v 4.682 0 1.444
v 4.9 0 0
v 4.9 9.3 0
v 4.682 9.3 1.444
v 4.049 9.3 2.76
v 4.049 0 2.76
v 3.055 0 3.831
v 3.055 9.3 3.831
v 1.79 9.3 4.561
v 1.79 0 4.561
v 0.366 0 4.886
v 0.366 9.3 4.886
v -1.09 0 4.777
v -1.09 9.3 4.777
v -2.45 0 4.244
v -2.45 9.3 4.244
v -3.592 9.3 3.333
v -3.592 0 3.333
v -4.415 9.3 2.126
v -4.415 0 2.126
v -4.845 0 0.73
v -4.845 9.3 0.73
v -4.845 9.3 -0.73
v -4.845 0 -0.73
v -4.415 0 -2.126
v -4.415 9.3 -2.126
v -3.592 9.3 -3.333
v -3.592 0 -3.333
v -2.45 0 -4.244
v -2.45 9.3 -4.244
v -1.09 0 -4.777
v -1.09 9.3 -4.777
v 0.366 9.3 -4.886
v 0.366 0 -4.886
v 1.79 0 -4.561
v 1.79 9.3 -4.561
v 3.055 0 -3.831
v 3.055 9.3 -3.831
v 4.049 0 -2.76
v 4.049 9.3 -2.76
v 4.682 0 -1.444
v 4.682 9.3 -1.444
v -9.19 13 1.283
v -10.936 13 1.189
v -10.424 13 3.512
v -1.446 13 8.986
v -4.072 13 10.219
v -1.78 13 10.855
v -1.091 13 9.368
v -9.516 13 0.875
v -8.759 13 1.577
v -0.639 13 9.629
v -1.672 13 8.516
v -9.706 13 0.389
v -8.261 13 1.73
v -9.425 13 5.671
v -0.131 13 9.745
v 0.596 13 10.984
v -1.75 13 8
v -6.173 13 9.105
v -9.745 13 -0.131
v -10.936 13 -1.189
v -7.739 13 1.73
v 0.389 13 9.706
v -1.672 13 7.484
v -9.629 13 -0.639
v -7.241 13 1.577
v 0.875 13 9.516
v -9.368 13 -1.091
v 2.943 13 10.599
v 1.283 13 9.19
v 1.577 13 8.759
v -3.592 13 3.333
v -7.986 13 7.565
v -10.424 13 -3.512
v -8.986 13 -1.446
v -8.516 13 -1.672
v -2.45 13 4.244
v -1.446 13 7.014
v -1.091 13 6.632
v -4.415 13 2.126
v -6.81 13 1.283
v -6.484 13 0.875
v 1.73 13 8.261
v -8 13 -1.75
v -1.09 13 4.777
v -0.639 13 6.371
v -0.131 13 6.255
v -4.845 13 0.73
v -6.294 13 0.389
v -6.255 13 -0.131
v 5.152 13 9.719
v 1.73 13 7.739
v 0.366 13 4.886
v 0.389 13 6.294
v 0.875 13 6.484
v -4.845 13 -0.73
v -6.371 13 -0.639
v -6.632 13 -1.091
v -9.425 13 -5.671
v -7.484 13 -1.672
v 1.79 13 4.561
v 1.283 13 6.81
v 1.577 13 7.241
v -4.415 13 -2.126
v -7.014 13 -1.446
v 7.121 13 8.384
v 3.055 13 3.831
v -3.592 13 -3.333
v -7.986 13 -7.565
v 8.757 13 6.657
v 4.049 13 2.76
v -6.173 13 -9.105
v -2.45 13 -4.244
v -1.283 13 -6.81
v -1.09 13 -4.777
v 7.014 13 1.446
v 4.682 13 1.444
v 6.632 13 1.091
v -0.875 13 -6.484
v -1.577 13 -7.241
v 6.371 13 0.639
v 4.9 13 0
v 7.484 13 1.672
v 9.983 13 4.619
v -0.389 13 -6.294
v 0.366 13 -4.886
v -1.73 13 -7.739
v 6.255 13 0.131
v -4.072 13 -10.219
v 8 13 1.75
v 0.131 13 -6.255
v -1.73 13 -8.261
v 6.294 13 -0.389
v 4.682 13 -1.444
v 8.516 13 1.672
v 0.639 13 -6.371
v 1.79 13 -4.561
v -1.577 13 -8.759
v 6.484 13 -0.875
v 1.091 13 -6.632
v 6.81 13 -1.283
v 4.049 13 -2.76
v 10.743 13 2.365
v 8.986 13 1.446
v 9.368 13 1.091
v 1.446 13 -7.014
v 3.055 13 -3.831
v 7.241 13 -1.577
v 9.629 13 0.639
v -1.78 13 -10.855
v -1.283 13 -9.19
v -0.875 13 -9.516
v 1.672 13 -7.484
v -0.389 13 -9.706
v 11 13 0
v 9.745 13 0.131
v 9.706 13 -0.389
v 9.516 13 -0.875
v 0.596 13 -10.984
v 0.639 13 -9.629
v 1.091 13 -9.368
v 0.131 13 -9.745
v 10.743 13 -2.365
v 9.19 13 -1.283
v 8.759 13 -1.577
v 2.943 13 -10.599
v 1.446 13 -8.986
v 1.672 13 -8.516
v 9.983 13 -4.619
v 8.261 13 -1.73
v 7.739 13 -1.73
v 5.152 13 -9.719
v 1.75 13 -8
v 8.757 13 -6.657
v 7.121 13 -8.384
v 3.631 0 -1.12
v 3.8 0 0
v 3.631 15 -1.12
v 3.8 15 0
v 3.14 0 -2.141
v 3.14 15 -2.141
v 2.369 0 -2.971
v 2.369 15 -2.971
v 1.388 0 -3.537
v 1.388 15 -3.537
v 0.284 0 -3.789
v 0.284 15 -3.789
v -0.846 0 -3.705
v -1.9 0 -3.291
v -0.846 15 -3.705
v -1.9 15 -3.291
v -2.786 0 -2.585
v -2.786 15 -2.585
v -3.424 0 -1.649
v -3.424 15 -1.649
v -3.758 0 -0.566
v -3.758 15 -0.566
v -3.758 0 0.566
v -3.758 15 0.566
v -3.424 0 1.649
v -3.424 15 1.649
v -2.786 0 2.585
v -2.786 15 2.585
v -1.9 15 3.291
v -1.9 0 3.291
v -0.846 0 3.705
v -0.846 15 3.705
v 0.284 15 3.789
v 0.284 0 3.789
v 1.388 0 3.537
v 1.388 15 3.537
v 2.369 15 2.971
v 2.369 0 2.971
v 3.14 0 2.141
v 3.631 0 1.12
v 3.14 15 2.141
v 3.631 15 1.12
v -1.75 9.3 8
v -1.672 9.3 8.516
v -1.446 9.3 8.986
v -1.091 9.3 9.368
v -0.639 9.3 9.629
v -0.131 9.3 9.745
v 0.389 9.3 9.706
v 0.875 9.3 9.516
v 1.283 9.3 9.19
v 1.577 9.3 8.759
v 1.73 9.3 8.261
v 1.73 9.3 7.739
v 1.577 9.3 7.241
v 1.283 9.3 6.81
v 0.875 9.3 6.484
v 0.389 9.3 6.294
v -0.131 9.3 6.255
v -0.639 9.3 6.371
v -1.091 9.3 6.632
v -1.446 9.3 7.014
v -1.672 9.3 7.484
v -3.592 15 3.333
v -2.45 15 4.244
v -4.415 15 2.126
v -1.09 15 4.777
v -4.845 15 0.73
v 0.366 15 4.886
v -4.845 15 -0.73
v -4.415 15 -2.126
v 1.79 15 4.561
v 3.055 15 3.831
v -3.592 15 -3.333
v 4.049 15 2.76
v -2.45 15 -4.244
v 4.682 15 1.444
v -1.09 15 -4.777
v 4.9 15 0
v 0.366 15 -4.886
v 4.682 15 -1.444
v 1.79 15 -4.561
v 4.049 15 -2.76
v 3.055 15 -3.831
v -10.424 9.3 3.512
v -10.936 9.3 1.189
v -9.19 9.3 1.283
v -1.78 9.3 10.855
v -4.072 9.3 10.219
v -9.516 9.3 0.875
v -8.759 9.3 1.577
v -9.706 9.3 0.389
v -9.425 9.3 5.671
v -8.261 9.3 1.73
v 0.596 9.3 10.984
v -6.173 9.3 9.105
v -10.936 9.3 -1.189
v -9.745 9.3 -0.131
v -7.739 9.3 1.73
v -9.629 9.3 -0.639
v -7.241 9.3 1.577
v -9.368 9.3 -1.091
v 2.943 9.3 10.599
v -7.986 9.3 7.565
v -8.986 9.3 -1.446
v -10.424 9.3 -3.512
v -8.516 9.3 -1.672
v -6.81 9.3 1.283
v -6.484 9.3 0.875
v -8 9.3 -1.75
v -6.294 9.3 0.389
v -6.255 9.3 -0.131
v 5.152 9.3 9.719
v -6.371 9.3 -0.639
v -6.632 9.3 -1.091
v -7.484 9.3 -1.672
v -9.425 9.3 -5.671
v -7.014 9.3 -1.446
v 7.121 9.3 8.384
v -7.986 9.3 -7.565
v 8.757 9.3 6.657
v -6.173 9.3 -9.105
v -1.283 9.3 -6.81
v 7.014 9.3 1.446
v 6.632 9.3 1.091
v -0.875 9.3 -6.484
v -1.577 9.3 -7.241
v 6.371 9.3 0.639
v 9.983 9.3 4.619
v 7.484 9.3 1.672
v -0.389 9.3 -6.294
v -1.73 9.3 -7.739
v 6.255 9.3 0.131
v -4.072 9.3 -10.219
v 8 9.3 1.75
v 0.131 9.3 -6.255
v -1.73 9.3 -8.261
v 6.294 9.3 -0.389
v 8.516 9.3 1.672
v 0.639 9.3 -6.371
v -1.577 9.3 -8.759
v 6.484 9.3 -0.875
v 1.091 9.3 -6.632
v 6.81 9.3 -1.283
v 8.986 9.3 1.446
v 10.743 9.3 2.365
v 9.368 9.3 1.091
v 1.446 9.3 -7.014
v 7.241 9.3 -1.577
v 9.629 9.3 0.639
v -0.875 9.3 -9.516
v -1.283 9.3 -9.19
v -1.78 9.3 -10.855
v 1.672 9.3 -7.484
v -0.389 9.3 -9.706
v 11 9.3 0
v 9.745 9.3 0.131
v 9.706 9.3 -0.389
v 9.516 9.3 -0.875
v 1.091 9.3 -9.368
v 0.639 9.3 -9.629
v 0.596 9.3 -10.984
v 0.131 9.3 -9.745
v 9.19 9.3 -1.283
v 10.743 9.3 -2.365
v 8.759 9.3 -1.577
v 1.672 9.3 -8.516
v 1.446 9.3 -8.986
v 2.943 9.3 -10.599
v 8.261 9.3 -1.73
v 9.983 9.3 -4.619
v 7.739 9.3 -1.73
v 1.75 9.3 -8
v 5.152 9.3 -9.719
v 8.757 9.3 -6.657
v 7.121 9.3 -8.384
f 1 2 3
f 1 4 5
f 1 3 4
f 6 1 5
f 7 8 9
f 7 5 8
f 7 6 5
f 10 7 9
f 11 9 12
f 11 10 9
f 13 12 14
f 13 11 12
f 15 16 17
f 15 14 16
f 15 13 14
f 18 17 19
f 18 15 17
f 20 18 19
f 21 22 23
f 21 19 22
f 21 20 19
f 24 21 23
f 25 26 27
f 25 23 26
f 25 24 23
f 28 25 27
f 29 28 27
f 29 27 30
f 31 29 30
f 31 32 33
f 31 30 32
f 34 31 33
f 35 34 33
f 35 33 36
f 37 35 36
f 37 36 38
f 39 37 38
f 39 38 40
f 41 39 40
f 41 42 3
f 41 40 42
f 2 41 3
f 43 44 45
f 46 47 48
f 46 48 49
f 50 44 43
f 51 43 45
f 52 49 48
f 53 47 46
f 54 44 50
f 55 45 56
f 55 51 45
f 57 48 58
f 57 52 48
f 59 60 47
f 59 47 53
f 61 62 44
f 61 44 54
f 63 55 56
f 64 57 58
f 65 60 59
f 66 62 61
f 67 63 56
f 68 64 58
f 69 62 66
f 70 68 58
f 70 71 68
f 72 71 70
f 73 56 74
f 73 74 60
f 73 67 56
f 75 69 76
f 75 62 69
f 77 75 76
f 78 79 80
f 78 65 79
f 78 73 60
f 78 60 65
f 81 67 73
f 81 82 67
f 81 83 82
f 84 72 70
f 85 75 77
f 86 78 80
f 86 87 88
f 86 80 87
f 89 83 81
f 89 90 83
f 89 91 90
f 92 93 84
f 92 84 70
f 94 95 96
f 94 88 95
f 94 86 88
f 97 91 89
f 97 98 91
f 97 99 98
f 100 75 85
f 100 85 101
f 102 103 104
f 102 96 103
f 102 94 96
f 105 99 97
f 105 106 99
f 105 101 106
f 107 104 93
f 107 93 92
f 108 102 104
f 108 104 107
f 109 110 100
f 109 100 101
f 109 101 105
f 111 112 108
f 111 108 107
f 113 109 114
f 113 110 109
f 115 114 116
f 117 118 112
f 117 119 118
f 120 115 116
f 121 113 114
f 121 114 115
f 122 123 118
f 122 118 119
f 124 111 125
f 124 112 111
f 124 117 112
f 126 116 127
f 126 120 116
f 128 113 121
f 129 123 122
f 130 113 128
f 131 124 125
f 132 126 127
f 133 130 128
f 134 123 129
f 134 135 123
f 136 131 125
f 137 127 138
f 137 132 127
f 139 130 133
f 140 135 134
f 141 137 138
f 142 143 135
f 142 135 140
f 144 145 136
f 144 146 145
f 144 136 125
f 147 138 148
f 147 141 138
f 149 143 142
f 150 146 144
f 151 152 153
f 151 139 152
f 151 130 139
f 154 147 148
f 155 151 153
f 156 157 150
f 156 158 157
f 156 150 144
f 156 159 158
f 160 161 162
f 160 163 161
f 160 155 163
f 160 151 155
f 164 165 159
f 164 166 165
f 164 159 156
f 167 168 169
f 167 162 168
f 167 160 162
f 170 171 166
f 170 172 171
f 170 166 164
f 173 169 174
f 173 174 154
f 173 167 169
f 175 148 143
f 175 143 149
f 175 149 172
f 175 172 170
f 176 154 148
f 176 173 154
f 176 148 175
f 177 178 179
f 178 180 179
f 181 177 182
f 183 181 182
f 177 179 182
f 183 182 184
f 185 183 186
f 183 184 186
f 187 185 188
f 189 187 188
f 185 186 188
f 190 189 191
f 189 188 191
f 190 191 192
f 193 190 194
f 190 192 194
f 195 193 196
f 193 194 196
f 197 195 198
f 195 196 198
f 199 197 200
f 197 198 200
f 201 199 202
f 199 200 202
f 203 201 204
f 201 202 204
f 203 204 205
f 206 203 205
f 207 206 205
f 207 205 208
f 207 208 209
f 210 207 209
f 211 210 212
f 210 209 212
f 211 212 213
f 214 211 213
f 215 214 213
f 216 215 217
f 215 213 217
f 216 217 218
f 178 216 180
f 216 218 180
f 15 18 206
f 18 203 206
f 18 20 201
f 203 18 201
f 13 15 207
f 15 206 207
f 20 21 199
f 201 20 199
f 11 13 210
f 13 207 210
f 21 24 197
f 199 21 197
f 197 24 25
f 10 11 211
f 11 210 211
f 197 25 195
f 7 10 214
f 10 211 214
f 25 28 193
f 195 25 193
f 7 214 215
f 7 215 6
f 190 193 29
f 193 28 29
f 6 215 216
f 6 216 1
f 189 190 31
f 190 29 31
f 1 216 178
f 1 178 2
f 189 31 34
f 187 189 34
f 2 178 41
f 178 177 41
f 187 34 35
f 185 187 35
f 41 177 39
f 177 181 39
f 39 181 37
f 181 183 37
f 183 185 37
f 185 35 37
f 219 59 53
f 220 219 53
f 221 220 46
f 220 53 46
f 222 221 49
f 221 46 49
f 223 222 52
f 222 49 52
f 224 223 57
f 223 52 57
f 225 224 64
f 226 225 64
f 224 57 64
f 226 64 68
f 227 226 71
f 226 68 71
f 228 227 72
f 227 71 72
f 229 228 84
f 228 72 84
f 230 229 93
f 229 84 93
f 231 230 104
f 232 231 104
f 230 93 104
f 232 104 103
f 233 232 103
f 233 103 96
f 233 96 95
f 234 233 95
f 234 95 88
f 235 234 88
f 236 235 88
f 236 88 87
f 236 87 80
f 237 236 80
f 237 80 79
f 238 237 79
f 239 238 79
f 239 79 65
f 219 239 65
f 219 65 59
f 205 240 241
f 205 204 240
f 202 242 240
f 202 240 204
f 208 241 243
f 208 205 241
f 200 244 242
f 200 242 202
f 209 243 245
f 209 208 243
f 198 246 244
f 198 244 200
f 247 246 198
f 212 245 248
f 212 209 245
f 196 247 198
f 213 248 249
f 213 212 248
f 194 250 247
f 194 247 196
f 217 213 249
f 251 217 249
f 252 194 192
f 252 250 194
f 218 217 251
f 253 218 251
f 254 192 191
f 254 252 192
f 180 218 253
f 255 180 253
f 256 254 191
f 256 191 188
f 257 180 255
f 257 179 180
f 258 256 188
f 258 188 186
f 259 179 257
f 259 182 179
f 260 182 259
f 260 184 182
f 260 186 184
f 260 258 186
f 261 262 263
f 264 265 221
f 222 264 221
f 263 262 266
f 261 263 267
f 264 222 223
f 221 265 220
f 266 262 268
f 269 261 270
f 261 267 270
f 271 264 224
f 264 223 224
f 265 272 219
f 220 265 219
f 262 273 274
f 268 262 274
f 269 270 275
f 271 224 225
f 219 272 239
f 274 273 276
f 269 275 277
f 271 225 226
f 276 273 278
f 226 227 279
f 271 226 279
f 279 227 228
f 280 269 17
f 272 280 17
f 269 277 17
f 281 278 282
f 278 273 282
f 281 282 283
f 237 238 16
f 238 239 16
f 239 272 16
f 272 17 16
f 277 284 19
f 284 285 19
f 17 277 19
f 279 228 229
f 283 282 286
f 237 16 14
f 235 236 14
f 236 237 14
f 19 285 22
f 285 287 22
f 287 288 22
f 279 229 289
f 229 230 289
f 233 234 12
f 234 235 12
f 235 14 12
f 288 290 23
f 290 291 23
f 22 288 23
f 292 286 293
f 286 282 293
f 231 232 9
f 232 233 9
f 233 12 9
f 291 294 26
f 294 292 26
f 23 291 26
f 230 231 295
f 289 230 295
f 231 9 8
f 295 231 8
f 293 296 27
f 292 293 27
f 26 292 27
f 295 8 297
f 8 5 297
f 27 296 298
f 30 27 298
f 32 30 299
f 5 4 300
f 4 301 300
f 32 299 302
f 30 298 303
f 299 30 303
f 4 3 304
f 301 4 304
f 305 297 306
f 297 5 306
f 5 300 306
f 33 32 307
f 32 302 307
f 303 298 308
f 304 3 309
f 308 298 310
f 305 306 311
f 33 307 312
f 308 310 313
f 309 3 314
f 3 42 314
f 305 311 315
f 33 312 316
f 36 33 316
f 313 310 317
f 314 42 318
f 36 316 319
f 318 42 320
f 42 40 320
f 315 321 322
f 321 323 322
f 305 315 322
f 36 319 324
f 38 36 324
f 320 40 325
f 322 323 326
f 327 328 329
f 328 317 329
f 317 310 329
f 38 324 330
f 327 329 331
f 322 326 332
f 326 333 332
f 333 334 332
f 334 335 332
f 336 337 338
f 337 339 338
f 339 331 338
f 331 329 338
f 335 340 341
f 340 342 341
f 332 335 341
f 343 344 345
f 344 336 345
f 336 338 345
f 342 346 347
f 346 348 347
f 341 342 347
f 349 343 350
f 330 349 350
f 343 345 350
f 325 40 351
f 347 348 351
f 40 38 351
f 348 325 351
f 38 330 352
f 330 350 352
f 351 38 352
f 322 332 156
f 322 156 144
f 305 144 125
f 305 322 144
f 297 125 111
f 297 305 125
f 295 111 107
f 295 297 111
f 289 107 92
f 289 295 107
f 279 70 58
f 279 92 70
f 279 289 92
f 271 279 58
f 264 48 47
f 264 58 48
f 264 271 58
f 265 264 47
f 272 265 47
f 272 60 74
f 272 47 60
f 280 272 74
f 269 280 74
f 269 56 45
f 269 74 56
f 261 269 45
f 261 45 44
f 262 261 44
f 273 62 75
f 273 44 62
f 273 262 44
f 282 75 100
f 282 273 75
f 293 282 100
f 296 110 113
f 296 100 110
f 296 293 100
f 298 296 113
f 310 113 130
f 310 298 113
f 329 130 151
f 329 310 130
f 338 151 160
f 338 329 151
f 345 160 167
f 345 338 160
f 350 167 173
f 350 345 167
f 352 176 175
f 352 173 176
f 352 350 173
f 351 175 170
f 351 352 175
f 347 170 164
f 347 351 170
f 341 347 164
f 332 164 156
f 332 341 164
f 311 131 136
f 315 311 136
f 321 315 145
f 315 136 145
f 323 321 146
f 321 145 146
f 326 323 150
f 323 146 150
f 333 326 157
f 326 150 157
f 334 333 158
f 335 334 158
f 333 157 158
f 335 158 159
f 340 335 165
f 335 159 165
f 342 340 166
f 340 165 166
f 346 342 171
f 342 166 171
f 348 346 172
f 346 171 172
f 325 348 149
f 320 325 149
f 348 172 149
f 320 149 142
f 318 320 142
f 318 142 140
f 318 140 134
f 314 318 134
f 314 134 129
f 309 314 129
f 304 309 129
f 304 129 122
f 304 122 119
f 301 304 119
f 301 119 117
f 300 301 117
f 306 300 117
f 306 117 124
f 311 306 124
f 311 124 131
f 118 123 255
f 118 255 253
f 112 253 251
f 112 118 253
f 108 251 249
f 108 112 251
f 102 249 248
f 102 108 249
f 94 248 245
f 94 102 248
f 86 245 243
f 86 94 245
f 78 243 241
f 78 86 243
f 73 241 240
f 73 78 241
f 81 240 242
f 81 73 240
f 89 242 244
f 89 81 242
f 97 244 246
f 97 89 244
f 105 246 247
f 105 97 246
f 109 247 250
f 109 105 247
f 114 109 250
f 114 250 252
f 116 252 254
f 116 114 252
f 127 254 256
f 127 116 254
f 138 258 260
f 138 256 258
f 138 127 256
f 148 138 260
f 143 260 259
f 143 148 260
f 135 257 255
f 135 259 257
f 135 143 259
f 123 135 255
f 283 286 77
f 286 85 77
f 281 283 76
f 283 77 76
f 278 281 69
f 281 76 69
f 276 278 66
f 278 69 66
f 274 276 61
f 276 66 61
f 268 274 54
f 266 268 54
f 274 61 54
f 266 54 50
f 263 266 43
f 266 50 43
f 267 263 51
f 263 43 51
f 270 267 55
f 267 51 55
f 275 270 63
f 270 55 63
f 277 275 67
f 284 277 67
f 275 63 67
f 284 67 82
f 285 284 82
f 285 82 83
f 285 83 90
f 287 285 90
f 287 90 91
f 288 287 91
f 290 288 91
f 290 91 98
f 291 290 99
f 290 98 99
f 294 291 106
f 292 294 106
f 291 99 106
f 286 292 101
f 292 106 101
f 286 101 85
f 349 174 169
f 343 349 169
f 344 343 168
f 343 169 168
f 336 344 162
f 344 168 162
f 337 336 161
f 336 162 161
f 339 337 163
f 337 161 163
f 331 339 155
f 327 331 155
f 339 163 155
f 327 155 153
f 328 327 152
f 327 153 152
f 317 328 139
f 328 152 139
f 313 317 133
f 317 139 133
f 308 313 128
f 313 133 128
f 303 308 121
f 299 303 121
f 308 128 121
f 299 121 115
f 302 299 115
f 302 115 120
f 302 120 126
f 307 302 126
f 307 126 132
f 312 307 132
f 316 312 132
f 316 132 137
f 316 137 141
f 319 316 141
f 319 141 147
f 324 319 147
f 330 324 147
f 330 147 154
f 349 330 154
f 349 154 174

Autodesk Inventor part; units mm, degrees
ref_plane "YZ Plane" through (0, 0, 0) normal (1, 0, 0) x (0, 1, 0)
ref_plane "XZ Plane" through (0, 0, 0) normal (0, 1, 0) x (-1, 0, 0)
ref_plane "XY Plane" through (0, 0, 0) normal (0, 0, 1) x (1, 0, 0)
sketch "Sketch1" plane through (0, 0, 0) normal (0, 0, 1) x (1, 0, 0)
  line L0 (3.8, 0) -> (3.8, 15)
  line L1 (3.8, 15) -> (4.9, 15)
  line L2 (4.9, 15) -> (4.9, 13)
  line L3 (4.9, 13) -> (11, 13)
  line L4 (11, 13) -> (11, 9.3)
  line L5 (11, 9.3) -> (4.9, 9.3)
  line L6 (4.9, 9.3) -> (4.9, 0)
  line L7 (4.9, 0) -> (3.8, 0)
  line L8 (-2.2, 0) -> (13.2, 0) projected
  line L9 (0, -3) -> (0, 18) projected
  point P0 (0, 0)
  point P1 (4.35, 0)
  point P2 (4.35, 15)
  point P3 (11, 11.15)
  dimension "d0" = 3.7
  dimension "d1" = 15
  dimension "d2" = 2
  dimension "d3" = 11
  dimension "d4" = 6.1
  dimension "d5" = 3.8
revolve "Revolution1" add sketch "Sketch1" angle 360 about axis through (0, -10, 0) along (0, 1, 0)
sketch "Sketch2" plane through (0, 13, 0) normal (0, 1, 0) x (1, 0, 0)
  circle A0 centre (0, 8) radius 1.75
  point P0 (0, 0)
  dimension "d7" = 3.5
  dimension "d8" = 8
extrude "Extrusion1" cut sketch "Sketch2" against normal up to surface (3.7 mm away)
pattern_circular "Circular Pattern1" count 4 over 360 about axis through (0, 11.15, 0) along (0, 1, 0) of "Extrusion1"
properties part number "Lead nut"
